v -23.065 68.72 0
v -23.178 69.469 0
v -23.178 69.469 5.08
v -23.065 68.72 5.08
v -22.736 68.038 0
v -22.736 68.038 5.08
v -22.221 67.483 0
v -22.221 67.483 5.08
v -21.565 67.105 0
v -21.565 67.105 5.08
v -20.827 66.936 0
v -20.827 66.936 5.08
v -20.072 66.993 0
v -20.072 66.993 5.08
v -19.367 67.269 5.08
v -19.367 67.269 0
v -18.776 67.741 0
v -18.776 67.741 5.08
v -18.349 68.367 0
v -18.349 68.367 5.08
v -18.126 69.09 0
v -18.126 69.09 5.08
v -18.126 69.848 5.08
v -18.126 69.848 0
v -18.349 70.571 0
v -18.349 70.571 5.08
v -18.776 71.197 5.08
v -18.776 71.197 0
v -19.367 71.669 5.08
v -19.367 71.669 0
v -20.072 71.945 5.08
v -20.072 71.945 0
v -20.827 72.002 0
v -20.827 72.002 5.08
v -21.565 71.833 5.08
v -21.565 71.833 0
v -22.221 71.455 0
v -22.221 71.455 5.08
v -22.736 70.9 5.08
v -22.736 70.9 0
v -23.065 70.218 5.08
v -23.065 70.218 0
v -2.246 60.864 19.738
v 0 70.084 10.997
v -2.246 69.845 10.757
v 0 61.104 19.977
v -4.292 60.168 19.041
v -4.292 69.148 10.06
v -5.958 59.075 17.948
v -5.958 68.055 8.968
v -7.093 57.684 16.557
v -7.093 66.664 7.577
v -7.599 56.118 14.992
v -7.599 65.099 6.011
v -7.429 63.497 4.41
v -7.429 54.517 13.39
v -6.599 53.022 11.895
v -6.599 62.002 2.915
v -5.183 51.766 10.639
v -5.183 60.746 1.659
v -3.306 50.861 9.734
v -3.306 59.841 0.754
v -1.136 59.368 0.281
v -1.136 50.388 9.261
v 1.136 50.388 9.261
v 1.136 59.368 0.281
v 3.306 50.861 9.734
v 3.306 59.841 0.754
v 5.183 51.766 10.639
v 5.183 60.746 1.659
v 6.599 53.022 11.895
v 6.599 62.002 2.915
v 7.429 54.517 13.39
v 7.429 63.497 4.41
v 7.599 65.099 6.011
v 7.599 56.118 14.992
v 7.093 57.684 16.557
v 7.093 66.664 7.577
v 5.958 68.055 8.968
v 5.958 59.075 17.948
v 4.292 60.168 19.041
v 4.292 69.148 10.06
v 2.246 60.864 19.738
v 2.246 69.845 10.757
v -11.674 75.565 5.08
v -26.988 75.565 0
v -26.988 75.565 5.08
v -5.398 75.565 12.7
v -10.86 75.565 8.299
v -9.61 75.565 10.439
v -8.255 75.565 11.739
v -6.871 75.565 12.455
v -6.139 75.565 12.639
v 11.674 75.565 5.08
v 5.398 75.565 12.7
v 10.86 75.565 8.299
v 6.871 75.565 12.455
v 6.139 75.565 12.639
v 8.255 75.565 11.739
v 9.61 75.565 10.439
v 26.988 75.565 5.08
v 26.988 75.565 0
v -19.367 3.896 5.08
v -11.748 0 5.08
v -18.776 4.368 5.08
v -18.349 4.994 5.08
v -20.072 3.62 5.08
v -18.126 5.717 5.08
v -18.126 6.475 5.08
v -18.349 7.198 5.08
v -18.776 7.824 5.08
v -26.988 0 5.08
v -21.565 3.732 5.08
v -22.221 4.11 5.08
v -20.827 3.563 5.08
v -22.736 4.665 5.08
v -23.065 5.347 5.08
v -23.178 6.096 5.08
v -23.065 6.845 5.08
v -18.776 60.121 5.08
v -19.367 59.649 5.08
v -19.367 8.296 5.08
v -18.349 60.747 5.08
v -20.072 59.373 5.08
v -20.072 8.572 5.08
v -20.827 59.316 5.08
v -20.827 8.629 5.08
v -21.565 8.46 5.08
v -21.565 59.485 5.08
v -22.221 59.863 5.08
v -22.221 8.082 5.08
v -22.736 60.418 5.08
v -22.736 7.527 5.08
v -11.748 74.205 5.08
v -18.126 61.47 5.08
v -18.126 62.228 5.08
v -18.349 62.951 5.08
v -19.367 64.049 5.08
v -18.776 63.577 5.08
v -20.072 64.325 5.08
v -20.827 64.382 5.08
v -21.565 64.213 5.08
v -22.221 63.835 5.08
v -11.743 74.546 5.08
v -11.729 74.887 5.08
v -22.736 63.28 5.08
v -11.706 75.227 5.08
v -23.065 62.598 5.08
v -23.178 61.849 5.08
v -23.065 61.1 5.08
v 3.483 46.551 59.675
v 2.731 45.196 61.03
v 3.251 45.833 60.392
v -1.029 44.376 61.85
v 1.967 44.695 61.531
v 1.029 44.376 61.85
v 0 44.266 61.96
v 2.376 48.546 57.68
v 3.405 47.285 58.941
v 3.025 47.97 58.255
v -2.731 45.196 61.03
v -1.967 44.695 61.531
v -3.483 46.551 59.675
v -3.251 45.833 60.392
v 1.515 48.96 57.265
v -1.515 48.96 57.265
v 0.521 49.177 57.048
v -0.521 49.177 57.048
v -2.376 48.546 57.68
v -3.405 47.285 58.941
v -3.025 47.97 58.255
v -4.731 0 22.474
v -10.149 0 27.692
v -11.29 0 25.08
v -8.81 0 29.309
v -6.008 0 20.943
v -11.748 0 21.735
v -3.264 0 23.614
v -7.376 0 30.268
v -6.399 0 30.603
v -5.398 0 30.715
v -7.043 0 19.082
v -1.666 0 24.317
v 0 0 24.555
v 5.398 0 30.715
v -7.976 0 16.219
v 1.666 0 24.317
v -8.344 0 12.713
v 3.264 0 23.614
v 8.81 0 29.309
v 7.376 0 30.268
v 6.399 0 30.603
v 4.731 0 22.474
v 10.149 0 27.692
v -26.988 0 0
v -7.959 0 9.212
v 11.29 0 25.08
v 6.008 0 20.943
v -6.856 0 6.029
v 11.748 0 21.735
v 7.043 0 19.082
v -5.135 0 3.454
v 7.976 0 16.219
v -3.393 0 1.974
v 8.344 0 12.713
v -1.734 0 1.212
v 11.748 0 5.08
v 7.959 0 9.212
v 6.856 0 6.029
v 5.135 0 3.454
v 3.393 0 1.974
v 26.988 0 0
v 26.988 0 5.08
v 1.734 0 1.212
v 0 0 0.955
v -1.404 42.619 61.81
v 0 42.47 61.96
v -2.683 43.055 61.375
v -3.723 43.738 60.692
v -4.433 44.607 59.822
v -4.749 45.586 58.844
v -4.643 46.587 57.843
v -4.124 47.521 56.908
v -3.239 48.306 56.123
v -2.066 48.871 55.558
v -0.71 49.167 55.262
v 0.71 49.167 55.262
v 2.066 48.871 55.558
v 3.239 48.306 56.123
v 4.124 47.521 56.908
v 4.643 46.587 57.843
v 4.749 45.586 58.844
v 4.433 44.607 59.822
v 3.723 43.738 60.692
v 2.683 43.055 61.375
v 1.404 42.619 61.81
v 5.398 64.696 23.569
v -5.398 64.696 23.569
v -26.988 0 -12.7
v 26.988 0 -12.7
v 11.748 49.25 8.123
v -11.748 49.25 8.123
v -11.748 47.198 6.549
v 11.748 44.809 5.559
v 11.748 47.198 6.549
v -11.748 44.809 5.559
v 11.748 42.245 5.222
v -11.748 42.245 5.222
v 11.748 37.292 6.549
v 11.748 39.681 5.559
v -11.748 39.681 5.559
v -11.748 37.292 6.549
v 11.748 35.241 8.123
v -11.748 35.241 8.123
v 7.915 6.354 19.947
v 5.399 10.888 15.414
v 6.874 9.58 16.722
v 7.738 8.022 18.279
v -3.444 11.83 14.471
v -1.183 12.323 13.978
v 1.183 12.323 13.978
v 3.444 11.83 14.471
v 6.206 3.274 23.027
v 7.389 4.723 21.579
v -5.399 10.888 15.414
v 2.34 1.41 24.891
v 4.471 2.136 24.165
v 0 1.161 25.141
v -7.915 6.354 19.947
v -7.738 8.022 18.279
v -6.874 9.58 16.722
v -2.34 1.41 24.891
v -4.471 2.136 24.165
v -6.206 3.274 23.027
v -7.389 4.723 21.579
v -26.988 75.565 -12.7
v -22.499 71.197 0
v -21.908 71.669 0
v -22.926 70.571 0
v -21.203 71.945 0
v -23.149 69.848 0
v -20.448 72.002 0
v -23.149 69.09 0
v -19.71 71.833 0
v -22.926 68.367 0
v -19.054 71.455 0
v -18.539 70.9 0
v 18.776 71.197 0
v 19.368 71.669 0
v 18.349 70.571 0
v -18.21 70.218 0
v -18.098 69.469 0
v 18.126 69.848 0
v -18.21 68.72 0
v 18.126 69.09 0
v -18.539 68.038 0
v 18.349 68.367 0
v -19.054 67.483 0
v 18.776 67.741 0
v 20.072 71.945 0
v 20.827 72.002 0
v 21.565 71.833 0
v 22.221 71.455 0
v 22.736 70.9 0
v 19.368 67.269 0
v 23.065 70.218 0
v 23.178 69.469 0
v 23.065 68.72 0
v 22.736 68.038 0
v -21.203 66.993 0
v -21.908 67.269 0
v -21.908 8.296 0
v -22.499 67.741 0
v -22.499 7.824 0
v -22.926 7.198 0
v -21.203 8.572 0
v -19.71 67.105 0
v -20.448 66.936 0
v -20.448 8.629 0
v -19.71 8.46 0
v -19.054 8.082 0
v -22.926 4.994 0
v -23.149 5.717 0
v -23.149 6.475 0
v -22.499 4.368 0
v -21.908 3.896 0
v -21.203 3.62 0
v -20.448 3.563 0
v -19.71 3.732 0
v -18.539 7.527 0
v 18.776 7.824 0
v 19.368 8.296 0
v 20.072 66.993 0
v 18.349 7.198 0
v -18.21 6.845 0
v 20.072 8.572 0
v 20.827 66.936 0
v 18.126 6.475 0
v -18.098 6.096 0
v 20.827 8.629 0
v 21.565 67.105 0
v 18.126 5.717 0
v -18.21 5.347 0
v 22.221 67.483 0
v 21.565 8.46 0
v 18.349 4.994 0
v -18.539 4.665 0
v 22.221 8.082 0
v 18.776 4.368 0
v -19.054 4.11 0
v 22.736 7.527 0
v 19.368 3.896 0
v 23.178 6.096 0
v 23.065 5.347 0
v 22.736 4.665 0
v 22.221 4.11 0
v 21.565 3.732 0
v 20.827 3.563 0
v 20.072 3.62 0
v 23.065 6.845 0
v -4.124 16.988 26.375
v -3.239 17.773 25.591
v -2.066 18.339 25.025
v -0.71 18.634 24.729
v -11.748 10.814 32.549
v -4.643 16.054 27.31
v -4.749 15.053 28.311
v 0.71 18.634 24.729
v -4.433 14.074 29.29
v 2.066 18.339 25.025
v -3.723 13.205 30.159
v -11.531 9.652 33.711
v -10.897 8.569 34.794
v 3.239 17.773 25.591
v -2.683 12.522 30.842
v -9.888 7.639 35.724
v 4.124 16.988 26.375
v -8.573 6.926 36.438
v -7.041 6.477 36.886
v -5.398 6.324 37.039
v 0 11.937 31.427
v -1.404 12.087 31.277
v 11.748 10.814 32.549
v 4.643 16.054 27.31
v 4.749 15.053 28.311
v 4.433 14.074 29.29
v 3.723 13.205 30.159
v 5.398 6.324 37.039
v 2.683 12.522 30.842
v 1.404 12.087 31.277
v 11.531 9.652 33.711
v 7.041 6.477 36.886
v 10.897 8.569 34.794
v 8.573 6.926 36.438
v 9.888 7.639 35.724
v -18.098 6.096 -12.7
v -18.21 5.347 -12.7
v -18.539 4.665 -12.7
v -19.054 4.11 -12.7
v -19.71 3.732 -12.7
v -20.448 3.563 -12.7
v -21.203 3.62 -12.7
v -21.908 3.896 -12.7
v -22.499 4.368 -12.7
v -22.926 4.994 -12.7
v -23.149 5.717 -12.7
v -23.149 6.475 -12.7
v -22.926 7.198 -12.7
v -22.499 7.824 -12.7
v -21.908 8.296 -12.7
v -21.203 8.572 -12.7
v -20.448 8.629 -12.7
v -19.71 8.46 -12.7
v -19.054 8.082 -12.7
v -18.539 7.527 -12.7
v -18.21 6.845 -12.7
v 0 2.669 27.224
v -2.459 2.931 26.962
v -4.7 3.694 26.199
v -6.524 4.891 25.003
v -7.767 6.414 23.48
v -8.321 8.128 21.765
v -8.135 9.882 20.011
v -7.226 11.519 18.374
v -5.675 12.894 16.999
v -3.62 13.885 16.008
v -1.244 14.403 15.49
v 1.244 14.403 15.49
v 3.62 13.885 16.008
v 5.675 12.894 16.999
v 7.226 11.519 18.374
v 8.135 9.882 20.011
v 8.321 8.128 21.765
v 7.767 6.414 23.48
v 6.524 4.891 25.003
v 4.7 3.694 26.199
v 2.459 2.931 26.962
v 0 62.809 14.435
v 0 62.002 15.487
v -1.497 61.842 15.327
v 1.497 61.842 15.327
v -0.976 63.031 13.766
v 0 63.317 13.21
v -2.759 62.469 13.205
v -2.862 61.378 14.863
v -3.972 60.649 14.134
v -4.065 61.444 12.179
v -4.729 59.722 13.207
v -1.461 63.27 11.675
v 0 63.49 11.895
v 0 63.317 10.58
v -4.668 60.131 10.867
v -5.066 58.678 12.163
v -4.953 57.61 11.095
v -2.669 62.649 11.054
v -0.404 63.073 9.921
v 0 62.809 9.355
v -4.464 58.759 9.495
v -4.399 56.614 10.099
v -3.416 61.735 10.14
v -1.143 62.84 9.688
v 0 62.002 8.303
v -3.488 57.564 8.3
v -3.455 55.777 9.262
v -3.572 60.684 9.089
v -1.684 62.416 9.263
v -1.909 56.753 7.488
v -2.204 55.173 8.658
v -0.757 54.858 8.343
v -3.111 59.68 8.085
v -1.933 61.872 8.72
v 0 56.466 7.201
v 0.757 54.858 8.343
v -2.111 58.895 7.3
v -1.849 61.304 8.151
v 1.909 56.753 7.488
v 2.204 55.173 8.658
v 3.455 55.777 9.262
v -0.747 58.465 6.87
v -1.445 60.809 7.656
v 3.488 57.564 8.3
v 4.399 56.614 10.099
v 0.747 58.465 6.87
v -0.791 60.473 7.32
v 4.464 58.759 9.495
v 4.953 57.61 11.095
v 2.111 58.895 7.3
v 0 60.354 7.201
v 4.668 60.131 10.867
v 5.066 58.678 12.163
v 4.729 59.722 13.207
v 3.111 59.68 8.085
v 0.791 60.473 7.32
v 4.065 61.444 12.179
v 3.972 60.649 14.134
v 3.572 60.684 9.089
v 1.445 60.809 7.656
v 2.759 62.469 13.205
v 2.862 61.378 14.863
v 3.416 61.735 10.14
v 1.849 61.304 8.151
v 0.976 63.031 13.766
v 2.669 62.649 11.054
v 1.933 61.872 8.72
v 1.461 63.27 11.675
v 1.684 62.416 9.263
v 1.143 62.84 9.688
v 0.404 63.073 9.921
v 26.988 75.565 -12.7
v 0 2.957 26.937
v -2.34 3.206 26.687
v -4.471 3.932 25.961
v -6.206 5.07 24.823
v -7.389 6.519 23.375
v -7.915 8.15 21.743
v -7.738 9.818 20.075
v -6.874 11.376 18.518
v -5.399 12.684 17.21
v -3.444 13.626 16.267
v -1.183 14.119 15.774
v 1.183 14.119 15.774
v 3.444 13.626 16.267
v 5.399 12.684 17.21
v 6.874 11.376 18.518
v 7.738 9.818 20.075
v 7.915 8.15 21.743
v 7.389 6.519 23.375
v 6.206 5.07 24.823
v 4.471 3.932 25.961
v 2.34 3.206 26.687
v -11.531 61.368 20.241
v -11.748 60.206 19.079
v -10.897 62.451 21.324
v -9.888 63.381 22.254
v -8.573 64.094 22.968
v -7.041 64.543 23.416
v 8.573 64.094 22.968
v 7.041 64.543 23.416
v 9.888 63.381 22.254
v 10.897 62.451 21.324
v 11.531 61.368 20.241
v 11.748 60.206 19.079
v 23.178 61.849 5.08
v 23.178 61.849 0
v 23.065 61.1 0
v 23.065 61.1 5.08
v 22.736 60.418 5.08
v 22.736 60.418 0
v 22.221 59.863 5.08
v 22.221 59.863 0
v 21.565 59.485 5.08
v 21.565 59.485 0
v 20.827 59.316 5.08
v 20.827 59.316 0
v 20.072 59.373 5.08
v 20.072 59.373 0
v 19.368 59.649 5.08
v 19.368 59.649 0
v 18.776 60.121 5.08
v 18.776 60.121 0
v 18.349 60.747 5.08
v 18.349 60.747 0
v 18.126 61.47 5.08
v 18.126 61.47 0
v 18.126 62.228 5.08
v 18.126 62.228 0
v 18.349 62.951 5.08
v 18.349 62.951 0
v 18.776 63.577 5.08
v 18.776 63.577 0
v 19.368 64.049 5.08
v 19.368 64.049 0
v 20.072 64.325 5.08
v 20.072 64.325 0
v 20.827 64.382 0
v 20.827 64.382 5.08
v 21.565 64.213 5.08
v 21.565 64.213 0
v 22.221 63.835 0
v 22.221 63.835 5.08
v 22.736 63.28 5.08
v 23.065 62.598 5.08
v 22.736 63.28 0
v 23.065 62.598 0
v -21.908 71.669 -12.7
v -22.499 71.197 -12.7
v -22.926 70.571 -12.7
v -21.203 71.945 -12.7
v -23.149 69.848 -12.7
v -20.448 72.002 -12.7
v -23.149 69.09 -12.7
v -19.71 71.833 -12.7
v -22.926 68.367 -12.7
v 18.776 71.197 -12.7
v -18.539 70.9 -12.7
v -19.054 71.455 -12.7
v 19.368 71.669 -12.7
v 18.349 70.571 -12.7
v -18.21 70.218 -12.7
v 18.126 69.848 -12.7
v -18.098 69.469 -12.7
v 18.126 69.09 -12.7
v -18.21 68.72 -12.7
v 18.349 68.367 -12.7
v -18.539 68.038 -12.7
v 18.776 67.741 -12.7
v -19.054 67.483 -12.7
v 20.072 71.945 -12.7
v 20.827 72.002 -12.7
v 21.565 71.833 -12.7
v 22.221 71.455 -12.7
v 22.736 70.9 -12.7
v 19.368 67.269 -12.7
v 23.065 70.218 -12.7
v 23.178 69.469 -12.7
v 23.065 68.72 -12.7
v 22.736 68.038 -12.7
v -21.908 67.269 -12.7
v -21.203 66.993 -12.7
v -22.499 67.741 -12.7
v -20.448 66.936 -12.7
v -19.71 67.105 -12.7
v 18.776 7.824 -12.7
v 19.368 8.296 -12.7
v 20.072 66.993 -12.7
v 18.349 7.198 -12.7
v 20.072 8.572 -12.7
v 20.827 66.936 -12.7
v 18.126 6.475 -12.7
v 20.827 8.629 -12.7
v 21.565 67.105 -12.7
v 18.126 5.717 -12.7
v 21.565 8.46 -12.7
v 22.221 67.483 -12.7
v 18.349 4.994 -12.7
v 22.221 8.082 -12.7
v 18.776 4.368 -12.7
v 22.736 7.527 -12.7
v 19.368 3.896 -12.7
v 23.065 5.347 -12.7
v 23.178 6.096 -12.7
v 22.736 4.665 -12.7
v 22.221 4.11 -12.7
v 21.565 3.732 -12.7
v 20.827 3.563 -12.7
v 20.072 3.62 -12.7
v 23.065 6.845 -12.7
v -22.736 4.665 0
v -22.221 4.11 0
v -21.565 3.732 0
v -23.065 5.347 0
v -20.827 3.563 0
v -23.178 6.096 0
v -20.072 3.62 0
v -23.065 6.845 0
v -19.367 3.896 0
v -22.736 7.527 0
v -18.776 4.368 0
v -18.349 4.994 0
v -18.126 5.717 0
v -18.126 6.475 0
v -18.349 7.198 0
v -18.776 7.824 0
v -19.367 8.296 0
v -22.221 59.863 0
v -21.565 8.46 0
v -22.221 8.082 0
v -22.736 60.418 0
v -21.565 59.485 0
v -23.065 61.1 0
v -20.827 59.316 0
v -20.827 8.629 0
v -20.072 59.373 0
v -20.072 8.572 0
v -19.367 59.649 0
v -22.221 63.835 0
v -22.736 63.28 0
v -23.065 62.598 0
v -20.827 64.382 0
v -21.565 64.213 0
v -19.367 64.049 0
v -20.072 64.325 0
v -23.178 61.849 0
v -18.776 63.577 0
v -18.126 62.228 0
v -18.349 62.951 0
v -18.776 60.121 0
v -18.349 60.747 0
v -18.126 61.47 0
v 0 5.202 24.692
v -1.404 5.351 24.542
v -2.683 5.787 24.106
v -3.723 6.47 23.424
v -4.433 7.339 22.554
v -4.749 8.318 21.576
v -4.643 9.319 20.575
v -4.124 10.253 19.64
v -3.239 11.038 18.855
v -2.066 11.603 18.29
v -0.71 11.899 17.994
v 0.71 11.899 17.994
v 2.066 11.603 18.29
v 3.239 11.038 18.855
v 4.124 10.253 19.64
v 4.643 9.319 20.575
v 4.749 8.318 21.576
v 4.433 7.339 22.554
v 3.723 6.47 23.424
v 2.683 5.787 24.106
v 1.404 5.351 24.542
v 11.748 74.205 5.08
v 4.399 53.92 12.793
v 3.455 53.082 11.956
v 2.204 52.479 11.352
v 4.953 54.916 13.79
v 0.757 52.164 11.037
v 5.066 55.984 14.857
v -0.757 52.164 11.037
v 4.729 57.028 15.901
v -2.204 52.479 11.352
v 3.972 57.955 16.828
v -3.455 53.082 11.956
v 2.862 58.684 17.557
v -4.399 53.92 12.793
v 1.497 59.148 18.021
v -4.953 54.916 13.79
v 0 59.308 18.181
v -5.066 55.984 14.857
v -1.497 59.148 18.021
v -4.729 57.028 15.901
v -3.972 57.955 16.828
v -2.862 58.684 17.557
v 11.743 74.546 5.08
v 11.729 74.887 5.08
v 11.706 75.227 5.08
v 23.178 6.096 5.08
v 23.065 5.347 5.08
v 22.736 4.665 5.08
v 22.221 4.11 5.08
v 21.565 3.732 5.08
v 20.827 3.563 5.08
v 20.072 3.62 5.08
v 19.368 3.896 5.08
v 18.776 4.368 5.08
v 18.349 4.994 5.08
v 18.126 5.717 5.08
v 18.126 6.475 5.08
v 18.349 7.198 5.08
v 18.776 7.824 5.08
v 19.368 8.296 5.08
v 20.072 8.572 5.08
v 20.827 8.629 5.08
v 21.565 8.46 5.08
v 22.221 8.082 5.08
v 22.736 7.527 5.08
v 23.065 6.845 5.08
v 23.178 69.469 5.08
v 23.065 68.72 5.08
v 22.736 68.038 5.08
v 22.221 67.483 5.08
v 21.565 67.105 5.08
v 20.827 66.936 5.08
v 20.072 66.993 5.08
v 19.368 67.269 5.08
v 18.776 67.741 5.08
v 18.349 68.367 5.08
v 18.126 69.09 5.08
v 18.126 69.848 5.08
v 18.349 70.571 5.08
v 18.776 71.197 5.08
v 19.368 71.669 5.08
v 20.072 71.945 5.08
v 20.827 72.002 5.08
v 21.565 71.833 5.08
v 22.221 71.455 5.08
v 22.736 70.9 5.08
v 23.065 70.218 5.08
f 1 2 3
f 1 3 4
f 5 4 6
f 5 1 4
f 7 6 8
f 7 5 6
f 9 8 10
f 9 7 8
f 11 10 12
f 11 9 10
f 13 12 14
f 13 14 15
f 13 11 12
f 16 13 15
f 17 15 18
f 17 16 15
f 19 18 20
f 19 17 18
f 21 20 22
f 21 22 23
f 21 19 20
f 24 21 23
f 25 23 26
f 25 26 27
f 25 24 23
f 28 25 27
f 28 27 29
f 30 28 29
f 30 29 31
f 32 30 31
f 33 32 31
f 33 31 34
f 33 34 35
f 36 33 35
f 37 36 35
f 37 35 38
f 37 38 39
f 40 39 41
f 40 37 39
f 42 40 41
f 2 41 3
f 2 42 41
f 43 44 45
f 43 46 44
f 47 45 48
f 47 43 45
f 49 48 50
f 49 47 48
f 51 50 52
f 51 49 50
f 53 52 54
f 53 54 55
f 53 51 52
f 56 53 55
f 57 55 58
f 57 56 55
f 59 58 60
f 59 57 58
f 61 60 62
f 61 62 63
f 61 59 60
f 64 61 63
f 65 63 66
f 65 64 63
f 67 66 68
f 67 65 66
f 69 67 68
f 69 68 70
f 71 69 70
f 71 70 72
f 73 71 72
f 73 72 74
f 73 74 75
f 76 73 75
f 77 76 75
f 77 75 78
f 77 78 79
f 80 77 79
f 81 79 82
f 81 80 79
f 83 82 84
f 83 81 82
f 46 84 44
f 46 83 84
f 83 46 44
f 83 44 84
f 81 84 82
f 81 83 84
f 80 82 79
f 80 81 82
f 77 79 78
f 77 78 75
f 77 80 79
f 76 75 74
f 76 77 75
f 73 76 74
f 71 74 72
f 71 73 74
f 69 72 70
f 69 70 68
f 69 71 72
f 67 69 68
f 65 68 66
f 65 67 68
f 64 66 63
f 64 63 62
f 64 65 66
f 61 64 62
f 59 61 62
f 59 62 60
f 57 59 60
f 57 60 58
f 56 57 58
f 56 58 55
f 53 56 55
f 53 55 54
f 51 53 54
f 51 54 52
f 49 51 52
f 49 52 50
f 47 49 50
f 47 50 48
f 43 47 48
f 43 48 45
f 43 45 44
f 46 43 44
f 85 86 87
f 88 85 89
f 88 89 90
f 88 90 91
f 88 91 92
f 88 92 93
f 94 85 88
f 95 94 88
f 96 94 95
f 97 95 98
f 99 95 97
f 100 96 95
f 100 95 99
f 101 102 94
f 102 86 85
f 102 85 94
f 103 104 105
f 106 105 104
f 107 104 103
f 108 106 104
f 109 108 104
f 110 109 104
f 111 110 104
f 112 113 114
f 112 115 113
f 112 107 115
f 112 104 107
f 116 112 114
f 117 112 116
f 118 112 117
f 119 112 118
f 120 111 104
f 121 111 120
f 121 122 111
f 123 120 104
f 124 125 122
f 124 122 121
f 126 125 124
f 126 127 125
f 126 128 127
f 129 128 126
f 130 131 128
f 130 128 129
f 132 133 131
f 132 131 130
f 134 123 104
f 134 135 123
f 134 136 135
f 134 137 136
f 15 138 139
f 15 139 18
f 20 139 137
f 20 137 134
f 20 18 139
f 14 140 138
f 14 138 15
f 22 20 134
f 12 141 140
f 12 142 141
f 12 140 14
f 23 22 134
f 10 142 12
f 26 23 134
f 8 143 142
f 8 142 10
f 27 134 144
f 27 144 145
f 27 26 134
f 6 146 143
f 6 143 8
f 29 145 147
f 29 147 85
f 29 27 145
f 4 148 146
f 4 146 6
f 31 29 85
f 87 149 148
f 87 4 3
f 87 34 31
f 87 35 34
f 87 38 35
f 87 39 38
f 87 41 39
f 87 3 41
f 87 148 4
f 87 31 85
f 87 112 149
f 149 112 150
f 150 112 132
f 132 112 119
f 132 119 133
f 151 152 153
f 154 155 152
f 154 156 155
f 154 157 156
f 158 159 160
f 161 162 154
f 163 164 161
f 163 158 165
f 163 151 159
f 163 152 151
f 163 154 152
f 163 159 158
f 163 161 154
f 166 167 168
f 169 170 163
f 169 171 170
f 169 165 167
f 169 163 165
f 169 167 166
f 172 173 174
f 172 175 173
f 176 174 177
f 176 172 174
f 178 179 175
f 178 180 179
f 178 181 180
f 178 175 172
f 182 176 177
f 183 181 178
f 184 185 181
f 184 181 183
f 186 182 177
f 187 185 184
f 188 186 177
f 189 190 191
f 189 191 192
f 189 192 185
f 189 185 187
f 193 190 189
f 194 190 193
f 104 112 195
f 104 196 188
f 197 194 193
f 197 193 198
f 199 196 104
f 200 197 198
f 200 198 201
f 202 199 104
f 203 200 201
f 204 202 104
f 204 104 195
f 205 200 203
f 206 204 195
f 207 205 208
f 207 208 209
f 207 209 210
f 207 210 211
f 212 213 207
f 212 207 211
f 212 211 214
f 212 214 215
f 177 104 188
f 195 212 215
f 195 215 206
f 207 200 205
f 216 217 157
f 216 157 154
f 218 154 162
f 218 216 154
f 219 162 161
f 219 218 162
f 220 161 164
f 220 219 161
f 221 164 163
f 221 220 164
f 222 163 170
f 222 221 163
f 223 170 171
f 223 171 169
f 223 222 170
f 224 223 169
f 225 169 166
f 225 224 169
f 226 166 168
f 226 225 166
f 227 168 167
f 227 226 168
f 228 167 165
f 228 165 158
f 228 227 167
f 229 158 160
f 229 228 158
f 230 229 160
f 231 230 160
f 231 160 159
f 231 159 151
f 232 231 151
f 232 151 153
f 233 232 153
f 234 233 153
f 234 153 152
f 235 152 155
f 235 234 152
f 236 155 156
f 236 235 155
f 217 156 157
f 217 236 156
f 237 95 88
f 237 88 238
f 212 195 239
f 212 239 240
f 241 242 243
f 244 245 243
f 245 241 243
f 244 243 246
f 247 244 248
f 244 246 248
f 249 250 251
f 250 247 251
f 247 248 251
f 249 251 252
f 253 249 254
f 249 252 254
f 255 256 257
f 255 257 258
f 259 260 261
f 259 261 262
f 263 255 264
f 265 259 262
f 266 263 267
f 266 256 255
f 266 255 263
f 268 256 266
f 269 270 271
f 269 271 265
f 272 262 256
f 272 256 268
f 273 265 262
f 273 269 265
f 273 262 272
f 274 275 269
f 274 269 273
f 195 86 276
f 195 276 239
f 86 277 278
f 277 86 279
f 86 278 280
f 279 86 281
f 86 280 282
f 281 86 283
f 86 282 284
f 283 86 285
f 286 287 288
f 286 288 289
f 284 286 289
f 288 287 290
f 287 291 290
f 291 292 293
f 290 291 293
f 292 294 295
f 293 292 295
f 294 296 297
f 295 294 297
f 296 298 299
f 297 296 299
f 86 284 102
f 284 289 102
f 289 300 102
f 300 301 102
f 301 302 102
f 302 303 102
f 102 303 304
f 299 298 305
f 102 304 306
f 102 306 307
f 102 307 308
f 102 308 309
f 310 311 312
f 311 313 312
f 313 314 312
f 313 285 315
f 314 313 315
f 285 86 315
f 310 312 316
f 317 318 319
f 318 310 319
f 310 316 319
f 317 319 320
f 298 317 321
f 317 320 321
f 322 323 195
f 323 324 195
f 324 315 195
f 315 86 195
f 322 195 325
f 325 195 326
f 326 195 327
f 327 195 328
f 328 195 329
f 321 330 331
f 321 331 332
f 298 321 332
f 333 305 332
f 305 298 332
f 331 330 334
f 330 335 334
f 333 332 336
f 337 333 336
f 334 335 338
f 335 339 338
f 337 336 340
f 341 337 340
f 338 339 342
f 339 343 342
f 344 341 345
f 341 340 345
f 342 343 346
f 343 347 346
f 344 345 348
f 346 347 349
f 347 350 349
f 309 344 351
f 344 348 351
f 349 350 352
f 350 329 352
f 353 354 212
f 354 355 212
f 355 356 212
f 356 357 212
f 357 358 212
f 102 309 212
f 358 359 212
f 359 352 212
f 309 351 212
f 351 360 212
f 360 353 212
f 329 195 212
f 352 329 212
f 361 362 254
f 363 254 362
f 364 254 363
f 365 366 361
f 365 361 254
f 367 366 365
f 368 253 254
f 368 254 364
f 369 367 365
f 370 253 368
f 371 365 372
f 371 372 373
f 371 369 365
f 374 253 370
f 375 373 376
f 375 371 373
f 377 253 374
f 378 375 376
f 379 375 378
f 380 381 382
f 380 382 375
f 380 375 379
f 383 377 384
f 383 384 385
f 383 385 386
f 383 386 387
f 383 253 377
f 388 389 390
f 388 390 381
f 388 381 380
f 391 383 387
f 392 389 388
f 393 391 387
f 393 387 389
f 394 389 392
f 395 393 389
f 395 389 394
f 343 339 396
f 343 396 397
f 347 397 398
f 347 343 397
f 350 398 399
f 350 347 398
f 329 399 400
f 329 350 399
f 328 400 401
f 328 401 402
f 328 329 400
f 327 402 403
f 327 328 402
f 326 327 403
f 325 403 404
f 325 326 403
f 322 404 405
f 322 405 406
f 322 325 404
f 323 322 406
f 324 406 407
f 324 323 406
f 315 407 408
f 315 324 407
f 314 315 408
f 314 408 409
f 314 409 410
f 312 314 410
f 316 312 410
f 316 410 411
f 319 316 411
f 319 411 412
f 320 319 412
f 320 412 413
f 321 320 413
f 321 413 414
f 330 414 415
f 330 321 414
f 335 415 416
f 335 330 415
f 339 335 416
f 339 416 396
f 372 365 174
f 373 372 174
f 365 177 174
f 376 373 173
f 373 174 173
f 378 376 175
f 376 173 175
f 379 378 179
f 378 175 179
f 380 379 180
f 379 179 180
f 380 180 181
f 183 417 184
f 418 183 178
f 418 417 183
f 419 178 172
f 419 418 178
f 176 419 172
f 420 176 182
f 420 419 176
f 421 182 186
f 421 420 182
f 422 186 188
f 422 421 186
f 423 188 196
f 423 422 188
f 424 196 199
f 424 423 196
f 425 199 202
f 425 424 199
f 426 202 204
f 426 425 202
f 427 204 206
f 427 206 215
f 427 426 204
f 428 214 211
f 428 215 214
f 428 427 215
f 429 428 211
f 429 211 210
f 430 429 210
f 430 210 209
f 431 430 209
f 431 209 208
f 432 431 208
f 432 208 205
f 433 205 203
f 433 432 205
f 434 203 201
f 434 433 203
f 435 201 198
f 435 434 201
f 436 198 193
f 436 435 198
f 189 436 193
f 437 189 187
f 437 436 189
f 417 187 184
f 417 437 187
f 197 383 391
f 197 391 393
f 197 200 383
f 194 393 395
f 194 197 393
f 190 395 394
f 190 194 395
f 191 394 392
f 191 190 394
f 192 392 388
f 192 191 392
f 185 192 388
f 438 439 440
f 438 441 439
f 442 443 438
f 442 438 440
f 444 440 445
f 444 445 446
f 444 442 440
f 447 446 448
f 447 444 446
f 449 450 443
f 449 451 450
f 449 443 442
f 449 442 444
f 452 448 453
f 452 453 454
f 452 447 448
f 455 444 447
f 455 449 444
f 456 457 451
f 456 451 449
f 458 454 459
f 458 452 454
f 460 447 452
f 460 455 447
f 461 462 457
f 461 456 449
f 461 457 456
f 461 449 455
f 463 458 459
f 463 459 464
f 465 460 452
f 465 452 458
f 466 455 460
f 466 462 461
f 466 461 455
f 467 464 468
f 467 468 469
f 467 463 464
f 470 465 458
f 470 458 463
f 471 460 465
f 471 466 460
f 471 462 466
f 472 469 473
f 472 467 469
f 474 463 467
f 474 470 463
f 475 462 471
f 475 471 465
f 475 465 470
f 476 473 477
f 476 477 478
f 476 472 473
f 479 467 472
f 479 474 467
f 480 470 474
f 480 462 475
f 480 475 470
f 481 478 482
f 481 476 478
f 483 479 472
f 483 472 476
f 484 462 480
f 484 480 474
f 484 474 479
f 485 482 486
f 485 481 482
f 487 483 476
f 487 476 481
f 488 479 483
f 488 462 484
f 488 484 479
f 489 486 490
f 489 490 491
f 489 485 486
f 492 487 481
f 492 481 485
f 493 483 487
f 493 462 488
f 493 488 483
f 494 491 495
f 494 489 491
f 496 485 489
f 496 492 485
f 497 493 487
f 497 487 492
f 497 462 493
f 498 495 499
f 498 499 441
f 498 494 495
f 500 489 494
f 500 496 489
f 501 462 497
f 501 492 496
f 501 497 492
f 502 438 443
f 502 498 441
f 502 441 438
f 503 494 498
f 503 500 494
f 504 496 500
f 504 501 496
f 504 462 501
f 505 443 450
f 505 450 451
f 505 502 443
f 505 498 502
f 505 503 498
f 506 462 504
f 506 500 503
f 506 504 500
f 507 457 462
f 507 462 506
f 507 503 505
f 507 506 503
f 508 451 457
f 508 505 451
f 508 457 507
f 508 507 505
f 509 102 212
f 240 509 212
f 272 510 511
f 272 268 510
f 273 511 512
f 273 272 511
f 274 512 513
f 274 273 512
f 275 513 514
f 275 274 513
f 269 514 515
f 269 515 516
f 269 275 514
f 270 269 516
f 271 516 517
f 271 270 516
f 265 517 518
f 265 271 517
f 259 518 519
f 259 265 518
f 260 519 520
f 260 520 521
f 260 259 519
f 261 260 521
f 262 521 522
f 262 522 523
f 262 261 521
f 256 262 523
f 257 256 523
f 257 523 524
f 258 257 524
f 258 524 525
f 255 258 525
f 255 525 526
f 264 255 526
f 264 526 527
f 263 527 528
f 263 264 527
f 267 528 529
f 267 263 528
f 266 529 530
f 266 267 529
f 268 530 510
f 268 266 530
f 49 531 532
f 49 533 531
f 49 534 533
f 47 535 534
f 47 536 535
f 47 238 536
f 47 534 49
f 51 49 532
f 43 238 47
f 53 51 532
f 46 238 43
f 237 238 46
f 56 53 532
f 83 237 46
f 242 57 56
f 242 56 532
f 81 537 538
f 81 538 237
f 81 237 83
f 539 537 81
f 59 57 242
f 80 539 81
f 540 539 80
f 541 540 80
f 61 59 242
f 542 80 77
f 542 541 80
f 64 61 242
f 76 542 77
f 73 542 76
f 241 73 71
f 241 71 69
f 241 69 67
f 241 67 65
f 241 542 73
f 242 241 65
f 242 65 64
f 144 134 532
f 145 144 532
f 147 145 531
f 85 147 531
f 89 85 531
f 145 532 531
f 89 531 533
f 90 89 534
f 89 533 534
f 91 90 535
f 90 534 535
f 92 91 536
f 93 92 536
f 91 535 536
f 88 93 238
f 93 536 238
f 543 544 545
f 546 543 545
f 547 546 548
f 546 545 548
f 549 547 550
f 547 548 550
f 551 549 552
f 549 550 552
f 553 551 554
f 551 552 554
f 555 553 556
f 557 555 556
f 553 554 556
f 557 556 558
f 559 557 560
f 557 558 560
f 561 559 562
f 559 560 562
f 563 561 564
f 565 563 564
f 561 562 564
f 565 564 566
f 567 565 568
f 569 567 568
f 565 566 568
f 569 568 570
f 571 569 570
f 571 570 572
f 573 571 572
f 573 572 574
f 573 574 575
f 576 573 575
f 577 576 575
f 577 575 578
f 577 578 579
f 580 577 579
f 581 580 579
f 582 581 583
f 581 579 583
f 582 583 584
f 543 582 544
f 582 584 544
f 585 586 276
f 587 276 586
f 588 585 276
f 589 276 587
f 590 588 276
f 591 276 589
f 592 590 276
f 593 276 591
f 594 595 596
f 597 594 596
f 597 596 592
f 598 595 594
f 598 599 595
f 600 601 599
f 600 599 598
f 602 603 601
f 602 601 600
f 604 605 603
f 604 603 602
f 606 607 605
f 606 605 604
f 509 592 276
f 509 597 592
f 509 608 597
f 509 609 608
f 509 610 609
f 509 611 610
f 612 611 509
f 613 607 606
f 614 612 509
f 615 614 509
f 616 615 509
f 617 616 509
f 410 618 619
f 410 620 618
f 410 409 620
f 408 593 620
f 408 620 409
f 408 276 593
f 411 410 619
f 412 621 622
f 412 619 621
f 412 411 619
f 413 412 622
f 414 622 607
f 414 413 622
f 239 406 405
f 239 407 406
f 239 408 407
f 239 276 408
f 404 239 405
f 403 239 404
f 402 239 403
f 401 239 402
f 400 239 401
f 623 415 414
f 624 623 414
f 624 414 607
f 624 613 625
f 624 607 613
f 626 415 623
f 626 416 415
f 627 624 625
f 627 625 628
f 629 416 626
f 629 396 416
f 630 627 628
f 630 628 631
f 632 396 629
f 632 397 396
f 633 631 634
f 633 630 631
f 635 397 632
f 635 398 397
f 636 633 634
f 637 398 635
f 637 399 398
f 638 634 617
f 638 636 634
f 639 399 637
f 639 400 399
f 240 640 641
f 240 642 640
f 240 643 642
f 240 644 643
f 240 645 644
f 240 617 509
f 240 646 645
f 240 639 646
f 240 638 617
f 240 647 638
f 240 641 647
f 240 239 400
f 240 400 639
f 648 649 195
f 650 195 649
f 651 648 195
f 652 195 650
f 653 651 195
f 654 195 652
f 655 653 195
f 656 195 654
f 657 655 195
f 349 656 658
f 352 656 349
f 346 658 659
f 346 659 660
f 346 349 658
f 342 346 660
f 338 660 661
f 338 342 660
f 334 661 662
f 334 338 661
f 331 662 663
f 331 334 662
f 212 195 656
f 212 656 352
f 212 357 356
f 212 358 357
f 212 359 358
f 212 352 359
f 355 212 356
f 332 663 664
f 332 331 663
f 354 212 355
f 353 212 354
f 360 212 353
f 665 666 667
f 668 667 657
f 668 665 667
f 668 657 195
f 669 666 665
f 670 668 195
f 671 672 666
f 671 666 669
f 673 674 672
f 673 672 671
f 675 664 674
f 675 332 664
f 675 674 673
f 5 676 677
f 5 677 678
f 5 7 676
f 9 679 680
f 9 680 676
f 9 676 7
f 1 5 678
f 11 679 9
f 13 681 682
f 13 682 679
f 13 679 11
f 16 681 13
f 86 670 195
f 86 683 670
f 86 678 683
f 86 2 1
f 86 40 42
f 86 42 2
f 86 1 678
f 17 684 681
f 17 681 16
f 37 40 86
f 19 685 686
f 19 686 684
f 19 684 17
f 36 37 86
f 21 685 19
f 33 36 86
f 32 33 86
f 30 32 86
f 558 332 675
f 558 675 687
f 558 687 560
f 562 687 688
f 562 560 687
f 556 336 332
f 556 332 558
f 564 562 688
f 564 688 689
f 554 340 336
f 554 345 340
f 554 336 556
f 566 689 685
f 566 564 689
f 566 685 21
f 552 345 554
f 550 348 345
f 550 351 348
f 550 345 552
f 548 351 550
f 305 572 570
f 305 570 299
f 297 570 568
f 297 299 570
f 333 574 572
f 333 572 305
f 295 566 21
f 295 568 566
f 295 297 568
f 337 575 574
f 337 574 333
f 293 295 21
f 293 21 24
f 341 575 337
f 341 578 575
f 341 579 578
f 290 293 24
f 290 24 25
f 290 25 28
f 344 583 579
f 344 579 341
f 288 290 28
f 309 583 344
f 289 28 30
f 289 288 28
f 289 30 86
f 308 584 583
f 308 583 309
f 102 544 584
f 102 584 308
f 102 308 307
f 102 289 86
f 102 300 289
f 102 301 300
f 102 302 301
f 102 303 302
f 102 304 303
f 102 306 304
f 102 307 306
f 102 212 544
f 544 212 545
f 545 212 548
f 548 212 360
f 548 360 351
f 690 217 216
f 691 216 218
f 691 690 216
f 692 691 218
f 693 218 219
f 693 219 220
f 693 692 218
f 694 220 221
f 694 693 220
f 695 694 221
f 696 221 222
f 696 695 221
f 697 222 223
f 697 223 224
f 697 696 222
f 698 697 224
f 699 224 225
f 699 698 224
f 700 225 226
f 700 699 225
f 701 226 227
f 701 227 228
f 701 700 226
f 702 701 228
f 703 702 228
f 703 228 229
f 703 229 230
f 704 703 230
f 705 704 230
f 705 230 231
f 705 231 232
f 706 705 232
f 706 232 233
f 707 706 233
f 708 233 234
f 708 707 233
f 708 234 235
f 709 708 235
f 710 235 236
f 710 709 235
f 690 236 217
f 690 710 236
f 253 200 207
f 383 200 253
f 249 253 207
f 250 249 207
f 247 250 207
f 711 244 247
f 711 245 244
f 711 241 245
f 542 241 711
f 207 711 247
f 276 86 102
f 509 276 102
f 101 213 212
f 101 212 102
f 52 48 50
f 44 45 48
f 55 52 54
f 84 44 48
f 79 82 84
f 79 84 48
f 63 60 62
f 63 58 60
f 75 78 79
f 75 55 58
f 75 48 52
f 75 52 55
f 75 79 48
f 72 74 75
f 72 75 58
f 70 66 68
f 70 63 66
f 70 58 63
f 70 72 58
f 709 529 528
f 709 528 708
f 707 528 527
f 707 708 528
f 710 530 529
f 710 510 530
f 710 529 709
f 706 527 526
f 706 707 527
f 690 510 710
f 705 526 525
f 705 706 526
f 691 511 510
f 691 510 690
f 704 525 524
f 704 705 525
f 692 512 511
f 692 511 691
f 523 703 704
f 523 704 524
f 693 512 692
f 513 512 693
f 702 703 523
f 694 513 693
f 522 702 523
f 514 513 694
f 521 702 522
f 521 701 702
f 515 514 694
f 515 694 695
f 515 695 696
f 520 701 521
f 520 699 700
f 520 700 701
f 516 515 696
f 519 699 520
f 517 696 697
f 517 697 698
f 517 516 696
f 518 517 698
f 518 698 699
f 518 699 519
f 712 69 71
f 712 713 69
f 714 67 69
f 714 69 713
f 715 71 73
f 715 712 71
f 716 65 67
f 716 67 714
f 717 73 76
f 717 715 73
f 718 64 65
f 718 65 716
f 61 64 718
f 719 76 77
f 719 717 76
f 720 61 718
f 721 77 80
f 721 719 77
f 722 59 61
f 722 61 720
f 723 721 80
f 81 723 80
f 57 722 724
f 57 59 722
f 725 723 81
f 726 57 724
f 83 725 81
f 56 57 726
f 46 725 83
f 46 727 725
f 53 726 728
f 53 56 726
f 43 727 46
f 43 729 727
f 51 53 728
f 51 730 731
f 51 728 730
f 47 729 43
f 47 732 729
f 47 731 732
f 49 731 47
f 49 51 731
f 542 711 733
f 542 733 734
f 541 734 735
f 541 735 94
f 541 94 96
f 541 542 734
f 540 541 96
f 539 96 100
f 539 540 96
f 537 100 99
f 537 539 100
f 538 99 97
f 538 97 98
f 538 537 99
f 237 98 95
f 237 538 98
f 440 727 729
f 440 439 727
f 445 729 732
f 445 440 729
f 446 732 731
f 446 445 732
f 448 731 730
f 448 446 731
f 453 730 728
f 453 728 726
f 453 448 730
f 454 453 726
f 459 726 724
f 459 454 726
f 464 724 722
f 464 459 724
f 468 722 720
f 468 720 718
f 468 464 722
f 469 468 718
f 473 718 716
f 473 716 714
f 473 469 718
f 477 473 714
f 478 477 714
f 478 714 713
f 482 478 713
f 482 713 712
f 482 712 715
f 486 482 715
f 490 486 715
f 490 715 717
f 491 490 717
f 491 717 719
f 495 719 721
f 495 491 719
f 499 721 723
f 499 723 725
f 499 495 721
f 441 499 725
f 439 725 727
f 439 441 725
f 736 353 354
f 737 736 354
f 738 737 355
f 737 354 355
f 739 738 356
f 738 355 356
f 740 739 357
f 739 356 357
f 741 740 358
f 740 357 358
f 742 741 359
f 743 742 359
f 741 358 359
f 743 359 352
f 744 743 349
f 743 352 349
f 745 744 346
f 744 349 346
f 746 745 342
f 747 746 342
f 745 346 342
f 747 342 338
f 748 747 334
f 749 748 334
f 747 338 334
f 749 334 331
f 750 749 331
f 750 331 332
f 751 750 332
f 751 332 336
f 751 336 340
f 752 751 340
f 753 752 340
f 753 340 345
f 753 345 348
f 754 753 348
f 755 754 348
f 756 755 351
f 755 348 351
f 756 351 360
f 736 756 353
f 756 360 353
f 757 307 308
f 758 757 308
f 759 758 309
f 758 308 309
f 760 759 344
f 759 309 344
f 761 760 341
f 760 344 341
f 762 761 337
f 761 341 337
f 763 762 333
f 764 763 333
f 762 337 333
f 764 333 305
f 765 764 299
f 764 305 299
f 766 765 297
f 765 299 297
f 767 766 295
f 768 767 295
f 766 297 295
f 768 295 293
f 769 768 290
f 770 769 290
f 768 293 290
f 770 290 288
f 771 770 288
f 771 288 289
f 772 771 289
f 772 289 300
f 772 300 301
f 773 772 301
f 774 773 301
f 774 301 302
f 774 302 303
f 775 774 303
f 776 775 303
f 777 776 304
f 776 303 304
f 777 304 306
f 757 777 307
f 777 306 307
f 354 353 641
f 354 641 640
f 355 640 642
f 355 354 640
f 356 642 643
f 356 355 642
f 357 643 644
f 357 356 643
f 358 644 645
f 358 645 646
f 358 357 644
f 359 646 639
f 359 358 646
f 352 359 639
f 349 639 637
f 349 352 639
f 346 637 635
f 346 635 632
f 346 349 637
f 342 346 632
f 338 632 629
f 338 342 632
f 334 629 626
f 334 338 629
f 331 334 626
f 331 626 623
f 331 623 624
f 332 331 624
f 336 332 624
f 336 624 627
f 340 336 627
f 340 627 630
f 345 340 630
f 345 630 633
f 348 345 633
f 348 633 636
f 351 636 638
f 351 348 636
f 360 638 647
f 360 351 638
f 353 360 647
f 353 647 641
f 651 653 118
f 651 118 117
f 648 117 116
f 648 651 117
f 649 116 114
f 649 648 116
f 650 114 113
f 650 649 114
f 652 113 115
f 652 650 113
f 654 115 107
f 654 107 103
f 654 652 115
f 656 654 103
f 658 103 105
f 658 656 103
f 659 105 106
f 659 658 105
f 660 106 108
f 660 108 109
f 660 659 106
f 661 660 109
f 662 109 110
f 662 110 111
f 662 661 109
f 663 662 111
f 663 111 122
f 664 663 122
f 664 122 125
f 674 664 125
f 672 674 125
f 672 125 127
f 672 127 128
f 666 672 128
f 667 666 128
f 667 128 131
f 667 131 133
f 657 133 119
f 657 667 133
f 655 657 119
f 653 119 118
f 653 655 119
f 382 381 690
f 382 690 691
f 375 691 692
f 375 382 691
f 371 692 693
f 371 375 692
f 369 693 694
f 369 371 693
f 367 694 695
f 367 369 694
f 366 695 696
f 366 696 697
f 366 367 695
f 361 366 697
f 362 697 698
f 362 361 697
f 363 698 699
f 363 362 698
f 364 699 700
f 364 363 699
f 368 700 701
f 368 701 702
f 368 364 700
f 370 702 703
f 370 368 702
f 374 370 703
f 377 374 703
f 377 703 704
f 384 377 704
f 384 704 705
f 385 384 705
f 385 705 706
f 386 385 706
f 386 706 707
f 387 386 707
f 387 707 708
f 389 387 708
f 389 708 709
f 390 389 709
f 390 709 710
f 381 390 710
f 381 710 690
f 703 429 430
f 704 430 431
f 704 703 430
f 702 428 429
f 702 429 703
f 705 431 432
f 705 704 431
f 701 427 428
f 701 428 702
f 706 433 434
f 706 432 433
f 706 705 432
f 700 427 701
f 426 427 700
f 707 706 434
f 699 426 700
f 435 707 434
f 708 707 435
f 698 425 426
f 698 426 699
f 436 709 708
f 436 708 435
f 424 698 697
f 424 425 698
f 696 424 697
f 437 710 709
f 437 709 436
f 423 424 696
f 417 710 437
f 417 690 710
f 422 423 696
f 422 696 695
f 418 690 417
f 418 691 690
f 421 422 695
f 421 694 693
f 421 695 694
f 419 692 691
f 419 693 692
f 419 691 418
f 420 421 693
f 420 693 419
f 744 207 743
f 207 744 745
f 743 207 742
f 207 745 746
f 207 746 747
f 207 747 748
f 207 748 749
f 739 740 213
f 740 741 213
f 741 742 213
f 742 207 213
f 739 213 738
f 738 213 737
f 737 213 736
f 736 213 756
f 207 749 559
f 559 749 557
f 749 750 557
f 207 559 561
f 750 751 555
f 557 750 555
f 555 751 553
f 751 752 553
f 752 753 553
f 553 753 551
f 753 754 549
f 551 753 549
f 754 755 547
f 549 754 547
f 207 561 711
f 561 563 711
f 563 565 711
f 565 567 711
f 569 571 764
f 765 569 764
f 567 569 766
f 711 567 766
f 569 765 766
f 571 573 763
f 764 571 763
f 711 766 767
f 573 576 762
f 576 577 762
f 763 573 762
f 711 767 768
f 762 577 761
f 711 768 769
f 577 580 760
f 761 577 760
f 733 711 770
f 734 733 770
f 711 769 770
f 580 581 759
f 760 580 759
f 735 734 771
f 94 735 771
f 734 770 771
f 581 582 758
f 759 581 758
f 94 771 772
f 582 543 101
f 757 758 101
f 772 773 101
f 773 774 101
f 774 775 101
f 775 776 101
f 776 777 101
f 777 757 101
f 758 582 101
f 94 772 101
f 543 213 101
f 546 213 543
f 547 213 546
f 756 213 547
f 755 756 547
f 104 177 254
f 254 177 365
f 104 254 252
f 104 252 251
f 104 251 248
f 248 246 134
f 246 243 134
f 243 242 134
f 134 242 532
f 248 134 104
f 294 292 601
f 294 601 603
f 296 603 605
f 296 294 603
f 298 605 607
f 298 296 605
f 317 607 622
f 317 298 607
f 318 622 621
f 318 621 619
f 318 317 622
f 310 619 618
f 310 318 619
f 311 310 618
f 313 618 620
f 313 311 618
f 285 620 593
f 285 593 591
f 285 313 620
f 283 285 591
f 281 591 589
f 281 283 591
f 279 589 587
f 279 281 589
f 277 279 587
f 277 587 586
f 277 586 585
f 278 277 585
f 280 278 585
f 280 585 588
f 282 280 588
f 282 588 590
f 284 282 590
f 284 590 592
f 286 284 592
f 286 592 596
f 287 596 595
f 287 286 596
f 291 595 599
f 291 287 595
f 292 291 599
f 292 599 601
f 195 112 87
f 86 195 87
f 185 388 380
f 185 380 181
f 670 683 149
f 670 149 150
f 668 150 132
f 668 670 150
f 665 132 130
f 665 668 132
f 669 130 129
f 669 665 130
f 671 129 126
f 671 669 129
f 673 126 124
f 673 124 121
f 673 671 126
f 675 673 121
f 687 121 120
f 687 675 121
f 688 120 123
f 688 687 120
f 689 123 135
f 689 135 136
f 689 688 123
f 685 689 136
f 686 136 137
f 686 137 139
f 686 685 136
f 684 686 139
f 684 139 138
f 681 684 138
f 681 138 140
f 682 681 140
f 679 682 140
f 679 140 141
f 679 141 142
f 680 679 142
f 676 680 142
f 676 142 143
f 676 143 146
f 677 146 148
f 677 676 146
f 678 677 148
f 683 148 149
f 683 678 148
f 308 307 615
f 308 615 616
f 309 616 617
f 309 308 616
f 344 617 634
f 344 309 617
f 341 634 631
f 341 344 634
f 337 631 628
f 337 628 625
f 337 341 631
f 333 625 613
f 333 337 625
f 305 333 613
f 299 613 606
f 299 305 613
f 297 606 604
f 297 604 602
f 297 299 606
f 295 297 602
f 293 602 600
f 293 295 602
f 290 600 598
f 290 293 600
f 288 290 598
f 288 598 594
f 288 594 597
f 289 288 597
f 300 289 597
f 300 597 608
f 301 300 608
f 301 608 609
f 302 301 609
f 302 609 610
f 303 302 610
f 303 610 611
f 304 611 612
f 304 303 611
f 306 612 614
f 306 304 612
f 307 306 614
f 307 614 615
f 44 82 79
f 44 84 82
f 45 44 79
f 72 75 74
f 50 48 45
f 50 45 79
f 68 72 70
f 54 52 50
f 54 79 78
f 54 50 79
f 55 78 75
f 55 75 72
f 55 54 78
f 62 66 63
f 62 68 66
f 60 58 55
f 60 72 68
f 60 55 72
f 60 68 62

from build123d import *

# Parameters (mm, degrees)
F1_DEPTH  = 26.9875
F2_R      = 9.906
F3_W      = 75.565
F3_H      = 31.9594877579
F4_DEPTH  = 15.24
F5_R      = 2.54
F6_DEPTH  = 5.08
F11_R     = 6.35
F17_SIZE  = 1.27
F18_W     = 53.975
F18_H     = 75.565
F18_R     = 2.54
F19_DEPTH = 12.7


with BuildPart() as f1:
    # F0 (on Right) → F1 (new body)
    with BuildSketch(Plane.YZ):
        Polygon((0, 30.7152561211), (0, 0), (75.565, 0), (75.565, 12.7), (64.6958964237, 23.5691035763), (42.2452561211, 1.1184632736), (6.3242316368, 37.0394877579), align=None)
    extrude(amount=F1_DEPTH)

    # F2
    f2_edges = [f1.edges().sort_by_distance(p)[0] for p in [
        (13.49375, 42.245256, 1.118463),
    ]]
    fillet(f2_edges, radius=F2_R)

    # F3 (on face) → F4 (cut)
    with BuildSketch(Plane.YZ.offset(26.9875)):
        with Locations((37.7825, 21.0597438789)):
            Rectangle(F3_W, F3_H)
    extrude(amount=-F4_DEPTH, mode=Mode.SUBTRACT)

    # F5 (on face) → F6 (cut, through all)
    with BuildSketch(Plane(origin=(0, 0, 0), x_dir=(1, 0, 0), z_dir=(0, 0, -1))):
        with Locations((20.6375, -6.096)):
            Circle(F5_R)
        with Locations((20.6375, -61.849)):
            Circle(F5_R)
        with Locations((20.6375, -69.469)):
            Circle(F5_R)
    extrude(amount=-F6_DEPTH, mode=Mode.SUBTRACT)

    # F7 (on face) → F8 (revolve, cut)
    with BuildSketch(Plane(origin=(0, 0, 0), x_dir=(0, -1, 0), z_dir=(-1, 0, 0))):
        Polygon((-5.2016996217, 24.6916355914), (-11.9368917125, 31.4268276822), (-15.3044877579, 28.0592316368), (6.3773719395, 6.3773719395), (12.277400211, 12.277400211), (-2.6692673955, 27.2240678175), align=None)
    revolve(axis=Axis((0, 4.4635579092, 17.2183017881), (0, 0.7071067812, 0.7071067812)), mode=Mode.SUBTRACT)

    # F11
    f11_edges = [f1.edges().sort_by_distance(p)[0] for p in [
        (11.7475, 70.130448, 18.134552),
        (11.7475, 3.162116, 33.877372),
    ]]
    fillet(f11_edges, radius=F11_R)

    # F12 (on Right) → F13 (revolve, cut)
    with BuildSketch(Plane.YZ):
        Polygon((70.0840500964, 10.9967450068), (61.1037939753, 19.9770011278), (55.7156403027, 14.5888474552), (64.6958964237, 5.6085913341), align=None)
    revolve(axis=Axis((0, 60.2057683632, 10.0987193947), (0, -0.7071067812, 0.7071067812)), mode=Mode.SUBTRACT)

    # F16: F1 across plane


with BuildPart() as f10:
    # F9 (on Right) → F10 (revolve)
    with BuildSketch(Plane.YZ):
        Polygon((5.2016996217, 24.6916355914), (2.9566355914, 26.9366996217), (1.1605843672, 25.1406483974), (6.7732444428, 19.5279883218), (46.7353841816, 59.4901280605), (43.3677881362, 62.8577241059), align=None)
    revolve(axis=Axis((0, 26.7543143122, 39.5090581912), (0, -0.7071067812, -0.7071067812)))

    # F17
    f17_edges = [f10.edges().sort_by_distance(p)[0] for p in [
        (0, 50.10298, 56.122532),
    ]]
    chamfer(f17_edges, length=F17_SIZE)


with BuildPart() as f15:
    # F14 (on Right) → F15 (revolve)
    with BuildSketch(Plane.YZ):
        with BuildLine():
            Line((70.0840500964, 10.9967450068), (61.1037939753, 19.9770011278))
            Line((61.1037939753, 19.9770011278), (59.3077427511, 18.1809499036))
            Line((59.3077427511, 18.1809499036), (62.0018195874, 15.4868730673))
            ThreePointArc((62.0018195874, 15.4868730673), (63.489717139, 11.8947706189), (62.0018195874, 8.3026681704))
            Line((62.0018195874, 8.3026681704), (64.6958964237, 5.6085913341))
            Line((64.6958964237, 5.6085913341), (70.0840500964, 10.9967450068))
        make_face()
    revolve(axis=Axis((0, 40.0001920908, 30.3042956671), (0, -0.7071067812, 0.7071067812)))


with BuildPart() as f1_1:
    add(f1.part)
    add(f1.part.mirror(Plane.YZ))


with BuildPart() as f19:
    # F18 (on face) → F19 (new body)
    with BuildSketch(Plane(origin=(0, 0, 0), x_dir=(1, 0, 0), z_dir=(0, 0, -1))):
        with Locations((0, -37.7825)):
            Rectangle(F18_W, F18_H)
        with Locations((-20.6375, -69.469)):
            Circle(F18_R, mode=Mode.SUBTRACT)
        with Locations((20.6375, -69.469)):
            Circle(F18_R, mode=Mode.SUBTRACT)
        with Locations((-20.6375, -6.096)):
            Circle(F18_R, mode=Mode.SUBTRACT)
        with Locations((20.6375, -6.096)):
            Circle(F18_R, mode=Mode.SUBTRACT)
    extrude(amount=F19_DEPTH)


solid = Compound([f10.part, f15.part, f1_1.part, f19.part])
